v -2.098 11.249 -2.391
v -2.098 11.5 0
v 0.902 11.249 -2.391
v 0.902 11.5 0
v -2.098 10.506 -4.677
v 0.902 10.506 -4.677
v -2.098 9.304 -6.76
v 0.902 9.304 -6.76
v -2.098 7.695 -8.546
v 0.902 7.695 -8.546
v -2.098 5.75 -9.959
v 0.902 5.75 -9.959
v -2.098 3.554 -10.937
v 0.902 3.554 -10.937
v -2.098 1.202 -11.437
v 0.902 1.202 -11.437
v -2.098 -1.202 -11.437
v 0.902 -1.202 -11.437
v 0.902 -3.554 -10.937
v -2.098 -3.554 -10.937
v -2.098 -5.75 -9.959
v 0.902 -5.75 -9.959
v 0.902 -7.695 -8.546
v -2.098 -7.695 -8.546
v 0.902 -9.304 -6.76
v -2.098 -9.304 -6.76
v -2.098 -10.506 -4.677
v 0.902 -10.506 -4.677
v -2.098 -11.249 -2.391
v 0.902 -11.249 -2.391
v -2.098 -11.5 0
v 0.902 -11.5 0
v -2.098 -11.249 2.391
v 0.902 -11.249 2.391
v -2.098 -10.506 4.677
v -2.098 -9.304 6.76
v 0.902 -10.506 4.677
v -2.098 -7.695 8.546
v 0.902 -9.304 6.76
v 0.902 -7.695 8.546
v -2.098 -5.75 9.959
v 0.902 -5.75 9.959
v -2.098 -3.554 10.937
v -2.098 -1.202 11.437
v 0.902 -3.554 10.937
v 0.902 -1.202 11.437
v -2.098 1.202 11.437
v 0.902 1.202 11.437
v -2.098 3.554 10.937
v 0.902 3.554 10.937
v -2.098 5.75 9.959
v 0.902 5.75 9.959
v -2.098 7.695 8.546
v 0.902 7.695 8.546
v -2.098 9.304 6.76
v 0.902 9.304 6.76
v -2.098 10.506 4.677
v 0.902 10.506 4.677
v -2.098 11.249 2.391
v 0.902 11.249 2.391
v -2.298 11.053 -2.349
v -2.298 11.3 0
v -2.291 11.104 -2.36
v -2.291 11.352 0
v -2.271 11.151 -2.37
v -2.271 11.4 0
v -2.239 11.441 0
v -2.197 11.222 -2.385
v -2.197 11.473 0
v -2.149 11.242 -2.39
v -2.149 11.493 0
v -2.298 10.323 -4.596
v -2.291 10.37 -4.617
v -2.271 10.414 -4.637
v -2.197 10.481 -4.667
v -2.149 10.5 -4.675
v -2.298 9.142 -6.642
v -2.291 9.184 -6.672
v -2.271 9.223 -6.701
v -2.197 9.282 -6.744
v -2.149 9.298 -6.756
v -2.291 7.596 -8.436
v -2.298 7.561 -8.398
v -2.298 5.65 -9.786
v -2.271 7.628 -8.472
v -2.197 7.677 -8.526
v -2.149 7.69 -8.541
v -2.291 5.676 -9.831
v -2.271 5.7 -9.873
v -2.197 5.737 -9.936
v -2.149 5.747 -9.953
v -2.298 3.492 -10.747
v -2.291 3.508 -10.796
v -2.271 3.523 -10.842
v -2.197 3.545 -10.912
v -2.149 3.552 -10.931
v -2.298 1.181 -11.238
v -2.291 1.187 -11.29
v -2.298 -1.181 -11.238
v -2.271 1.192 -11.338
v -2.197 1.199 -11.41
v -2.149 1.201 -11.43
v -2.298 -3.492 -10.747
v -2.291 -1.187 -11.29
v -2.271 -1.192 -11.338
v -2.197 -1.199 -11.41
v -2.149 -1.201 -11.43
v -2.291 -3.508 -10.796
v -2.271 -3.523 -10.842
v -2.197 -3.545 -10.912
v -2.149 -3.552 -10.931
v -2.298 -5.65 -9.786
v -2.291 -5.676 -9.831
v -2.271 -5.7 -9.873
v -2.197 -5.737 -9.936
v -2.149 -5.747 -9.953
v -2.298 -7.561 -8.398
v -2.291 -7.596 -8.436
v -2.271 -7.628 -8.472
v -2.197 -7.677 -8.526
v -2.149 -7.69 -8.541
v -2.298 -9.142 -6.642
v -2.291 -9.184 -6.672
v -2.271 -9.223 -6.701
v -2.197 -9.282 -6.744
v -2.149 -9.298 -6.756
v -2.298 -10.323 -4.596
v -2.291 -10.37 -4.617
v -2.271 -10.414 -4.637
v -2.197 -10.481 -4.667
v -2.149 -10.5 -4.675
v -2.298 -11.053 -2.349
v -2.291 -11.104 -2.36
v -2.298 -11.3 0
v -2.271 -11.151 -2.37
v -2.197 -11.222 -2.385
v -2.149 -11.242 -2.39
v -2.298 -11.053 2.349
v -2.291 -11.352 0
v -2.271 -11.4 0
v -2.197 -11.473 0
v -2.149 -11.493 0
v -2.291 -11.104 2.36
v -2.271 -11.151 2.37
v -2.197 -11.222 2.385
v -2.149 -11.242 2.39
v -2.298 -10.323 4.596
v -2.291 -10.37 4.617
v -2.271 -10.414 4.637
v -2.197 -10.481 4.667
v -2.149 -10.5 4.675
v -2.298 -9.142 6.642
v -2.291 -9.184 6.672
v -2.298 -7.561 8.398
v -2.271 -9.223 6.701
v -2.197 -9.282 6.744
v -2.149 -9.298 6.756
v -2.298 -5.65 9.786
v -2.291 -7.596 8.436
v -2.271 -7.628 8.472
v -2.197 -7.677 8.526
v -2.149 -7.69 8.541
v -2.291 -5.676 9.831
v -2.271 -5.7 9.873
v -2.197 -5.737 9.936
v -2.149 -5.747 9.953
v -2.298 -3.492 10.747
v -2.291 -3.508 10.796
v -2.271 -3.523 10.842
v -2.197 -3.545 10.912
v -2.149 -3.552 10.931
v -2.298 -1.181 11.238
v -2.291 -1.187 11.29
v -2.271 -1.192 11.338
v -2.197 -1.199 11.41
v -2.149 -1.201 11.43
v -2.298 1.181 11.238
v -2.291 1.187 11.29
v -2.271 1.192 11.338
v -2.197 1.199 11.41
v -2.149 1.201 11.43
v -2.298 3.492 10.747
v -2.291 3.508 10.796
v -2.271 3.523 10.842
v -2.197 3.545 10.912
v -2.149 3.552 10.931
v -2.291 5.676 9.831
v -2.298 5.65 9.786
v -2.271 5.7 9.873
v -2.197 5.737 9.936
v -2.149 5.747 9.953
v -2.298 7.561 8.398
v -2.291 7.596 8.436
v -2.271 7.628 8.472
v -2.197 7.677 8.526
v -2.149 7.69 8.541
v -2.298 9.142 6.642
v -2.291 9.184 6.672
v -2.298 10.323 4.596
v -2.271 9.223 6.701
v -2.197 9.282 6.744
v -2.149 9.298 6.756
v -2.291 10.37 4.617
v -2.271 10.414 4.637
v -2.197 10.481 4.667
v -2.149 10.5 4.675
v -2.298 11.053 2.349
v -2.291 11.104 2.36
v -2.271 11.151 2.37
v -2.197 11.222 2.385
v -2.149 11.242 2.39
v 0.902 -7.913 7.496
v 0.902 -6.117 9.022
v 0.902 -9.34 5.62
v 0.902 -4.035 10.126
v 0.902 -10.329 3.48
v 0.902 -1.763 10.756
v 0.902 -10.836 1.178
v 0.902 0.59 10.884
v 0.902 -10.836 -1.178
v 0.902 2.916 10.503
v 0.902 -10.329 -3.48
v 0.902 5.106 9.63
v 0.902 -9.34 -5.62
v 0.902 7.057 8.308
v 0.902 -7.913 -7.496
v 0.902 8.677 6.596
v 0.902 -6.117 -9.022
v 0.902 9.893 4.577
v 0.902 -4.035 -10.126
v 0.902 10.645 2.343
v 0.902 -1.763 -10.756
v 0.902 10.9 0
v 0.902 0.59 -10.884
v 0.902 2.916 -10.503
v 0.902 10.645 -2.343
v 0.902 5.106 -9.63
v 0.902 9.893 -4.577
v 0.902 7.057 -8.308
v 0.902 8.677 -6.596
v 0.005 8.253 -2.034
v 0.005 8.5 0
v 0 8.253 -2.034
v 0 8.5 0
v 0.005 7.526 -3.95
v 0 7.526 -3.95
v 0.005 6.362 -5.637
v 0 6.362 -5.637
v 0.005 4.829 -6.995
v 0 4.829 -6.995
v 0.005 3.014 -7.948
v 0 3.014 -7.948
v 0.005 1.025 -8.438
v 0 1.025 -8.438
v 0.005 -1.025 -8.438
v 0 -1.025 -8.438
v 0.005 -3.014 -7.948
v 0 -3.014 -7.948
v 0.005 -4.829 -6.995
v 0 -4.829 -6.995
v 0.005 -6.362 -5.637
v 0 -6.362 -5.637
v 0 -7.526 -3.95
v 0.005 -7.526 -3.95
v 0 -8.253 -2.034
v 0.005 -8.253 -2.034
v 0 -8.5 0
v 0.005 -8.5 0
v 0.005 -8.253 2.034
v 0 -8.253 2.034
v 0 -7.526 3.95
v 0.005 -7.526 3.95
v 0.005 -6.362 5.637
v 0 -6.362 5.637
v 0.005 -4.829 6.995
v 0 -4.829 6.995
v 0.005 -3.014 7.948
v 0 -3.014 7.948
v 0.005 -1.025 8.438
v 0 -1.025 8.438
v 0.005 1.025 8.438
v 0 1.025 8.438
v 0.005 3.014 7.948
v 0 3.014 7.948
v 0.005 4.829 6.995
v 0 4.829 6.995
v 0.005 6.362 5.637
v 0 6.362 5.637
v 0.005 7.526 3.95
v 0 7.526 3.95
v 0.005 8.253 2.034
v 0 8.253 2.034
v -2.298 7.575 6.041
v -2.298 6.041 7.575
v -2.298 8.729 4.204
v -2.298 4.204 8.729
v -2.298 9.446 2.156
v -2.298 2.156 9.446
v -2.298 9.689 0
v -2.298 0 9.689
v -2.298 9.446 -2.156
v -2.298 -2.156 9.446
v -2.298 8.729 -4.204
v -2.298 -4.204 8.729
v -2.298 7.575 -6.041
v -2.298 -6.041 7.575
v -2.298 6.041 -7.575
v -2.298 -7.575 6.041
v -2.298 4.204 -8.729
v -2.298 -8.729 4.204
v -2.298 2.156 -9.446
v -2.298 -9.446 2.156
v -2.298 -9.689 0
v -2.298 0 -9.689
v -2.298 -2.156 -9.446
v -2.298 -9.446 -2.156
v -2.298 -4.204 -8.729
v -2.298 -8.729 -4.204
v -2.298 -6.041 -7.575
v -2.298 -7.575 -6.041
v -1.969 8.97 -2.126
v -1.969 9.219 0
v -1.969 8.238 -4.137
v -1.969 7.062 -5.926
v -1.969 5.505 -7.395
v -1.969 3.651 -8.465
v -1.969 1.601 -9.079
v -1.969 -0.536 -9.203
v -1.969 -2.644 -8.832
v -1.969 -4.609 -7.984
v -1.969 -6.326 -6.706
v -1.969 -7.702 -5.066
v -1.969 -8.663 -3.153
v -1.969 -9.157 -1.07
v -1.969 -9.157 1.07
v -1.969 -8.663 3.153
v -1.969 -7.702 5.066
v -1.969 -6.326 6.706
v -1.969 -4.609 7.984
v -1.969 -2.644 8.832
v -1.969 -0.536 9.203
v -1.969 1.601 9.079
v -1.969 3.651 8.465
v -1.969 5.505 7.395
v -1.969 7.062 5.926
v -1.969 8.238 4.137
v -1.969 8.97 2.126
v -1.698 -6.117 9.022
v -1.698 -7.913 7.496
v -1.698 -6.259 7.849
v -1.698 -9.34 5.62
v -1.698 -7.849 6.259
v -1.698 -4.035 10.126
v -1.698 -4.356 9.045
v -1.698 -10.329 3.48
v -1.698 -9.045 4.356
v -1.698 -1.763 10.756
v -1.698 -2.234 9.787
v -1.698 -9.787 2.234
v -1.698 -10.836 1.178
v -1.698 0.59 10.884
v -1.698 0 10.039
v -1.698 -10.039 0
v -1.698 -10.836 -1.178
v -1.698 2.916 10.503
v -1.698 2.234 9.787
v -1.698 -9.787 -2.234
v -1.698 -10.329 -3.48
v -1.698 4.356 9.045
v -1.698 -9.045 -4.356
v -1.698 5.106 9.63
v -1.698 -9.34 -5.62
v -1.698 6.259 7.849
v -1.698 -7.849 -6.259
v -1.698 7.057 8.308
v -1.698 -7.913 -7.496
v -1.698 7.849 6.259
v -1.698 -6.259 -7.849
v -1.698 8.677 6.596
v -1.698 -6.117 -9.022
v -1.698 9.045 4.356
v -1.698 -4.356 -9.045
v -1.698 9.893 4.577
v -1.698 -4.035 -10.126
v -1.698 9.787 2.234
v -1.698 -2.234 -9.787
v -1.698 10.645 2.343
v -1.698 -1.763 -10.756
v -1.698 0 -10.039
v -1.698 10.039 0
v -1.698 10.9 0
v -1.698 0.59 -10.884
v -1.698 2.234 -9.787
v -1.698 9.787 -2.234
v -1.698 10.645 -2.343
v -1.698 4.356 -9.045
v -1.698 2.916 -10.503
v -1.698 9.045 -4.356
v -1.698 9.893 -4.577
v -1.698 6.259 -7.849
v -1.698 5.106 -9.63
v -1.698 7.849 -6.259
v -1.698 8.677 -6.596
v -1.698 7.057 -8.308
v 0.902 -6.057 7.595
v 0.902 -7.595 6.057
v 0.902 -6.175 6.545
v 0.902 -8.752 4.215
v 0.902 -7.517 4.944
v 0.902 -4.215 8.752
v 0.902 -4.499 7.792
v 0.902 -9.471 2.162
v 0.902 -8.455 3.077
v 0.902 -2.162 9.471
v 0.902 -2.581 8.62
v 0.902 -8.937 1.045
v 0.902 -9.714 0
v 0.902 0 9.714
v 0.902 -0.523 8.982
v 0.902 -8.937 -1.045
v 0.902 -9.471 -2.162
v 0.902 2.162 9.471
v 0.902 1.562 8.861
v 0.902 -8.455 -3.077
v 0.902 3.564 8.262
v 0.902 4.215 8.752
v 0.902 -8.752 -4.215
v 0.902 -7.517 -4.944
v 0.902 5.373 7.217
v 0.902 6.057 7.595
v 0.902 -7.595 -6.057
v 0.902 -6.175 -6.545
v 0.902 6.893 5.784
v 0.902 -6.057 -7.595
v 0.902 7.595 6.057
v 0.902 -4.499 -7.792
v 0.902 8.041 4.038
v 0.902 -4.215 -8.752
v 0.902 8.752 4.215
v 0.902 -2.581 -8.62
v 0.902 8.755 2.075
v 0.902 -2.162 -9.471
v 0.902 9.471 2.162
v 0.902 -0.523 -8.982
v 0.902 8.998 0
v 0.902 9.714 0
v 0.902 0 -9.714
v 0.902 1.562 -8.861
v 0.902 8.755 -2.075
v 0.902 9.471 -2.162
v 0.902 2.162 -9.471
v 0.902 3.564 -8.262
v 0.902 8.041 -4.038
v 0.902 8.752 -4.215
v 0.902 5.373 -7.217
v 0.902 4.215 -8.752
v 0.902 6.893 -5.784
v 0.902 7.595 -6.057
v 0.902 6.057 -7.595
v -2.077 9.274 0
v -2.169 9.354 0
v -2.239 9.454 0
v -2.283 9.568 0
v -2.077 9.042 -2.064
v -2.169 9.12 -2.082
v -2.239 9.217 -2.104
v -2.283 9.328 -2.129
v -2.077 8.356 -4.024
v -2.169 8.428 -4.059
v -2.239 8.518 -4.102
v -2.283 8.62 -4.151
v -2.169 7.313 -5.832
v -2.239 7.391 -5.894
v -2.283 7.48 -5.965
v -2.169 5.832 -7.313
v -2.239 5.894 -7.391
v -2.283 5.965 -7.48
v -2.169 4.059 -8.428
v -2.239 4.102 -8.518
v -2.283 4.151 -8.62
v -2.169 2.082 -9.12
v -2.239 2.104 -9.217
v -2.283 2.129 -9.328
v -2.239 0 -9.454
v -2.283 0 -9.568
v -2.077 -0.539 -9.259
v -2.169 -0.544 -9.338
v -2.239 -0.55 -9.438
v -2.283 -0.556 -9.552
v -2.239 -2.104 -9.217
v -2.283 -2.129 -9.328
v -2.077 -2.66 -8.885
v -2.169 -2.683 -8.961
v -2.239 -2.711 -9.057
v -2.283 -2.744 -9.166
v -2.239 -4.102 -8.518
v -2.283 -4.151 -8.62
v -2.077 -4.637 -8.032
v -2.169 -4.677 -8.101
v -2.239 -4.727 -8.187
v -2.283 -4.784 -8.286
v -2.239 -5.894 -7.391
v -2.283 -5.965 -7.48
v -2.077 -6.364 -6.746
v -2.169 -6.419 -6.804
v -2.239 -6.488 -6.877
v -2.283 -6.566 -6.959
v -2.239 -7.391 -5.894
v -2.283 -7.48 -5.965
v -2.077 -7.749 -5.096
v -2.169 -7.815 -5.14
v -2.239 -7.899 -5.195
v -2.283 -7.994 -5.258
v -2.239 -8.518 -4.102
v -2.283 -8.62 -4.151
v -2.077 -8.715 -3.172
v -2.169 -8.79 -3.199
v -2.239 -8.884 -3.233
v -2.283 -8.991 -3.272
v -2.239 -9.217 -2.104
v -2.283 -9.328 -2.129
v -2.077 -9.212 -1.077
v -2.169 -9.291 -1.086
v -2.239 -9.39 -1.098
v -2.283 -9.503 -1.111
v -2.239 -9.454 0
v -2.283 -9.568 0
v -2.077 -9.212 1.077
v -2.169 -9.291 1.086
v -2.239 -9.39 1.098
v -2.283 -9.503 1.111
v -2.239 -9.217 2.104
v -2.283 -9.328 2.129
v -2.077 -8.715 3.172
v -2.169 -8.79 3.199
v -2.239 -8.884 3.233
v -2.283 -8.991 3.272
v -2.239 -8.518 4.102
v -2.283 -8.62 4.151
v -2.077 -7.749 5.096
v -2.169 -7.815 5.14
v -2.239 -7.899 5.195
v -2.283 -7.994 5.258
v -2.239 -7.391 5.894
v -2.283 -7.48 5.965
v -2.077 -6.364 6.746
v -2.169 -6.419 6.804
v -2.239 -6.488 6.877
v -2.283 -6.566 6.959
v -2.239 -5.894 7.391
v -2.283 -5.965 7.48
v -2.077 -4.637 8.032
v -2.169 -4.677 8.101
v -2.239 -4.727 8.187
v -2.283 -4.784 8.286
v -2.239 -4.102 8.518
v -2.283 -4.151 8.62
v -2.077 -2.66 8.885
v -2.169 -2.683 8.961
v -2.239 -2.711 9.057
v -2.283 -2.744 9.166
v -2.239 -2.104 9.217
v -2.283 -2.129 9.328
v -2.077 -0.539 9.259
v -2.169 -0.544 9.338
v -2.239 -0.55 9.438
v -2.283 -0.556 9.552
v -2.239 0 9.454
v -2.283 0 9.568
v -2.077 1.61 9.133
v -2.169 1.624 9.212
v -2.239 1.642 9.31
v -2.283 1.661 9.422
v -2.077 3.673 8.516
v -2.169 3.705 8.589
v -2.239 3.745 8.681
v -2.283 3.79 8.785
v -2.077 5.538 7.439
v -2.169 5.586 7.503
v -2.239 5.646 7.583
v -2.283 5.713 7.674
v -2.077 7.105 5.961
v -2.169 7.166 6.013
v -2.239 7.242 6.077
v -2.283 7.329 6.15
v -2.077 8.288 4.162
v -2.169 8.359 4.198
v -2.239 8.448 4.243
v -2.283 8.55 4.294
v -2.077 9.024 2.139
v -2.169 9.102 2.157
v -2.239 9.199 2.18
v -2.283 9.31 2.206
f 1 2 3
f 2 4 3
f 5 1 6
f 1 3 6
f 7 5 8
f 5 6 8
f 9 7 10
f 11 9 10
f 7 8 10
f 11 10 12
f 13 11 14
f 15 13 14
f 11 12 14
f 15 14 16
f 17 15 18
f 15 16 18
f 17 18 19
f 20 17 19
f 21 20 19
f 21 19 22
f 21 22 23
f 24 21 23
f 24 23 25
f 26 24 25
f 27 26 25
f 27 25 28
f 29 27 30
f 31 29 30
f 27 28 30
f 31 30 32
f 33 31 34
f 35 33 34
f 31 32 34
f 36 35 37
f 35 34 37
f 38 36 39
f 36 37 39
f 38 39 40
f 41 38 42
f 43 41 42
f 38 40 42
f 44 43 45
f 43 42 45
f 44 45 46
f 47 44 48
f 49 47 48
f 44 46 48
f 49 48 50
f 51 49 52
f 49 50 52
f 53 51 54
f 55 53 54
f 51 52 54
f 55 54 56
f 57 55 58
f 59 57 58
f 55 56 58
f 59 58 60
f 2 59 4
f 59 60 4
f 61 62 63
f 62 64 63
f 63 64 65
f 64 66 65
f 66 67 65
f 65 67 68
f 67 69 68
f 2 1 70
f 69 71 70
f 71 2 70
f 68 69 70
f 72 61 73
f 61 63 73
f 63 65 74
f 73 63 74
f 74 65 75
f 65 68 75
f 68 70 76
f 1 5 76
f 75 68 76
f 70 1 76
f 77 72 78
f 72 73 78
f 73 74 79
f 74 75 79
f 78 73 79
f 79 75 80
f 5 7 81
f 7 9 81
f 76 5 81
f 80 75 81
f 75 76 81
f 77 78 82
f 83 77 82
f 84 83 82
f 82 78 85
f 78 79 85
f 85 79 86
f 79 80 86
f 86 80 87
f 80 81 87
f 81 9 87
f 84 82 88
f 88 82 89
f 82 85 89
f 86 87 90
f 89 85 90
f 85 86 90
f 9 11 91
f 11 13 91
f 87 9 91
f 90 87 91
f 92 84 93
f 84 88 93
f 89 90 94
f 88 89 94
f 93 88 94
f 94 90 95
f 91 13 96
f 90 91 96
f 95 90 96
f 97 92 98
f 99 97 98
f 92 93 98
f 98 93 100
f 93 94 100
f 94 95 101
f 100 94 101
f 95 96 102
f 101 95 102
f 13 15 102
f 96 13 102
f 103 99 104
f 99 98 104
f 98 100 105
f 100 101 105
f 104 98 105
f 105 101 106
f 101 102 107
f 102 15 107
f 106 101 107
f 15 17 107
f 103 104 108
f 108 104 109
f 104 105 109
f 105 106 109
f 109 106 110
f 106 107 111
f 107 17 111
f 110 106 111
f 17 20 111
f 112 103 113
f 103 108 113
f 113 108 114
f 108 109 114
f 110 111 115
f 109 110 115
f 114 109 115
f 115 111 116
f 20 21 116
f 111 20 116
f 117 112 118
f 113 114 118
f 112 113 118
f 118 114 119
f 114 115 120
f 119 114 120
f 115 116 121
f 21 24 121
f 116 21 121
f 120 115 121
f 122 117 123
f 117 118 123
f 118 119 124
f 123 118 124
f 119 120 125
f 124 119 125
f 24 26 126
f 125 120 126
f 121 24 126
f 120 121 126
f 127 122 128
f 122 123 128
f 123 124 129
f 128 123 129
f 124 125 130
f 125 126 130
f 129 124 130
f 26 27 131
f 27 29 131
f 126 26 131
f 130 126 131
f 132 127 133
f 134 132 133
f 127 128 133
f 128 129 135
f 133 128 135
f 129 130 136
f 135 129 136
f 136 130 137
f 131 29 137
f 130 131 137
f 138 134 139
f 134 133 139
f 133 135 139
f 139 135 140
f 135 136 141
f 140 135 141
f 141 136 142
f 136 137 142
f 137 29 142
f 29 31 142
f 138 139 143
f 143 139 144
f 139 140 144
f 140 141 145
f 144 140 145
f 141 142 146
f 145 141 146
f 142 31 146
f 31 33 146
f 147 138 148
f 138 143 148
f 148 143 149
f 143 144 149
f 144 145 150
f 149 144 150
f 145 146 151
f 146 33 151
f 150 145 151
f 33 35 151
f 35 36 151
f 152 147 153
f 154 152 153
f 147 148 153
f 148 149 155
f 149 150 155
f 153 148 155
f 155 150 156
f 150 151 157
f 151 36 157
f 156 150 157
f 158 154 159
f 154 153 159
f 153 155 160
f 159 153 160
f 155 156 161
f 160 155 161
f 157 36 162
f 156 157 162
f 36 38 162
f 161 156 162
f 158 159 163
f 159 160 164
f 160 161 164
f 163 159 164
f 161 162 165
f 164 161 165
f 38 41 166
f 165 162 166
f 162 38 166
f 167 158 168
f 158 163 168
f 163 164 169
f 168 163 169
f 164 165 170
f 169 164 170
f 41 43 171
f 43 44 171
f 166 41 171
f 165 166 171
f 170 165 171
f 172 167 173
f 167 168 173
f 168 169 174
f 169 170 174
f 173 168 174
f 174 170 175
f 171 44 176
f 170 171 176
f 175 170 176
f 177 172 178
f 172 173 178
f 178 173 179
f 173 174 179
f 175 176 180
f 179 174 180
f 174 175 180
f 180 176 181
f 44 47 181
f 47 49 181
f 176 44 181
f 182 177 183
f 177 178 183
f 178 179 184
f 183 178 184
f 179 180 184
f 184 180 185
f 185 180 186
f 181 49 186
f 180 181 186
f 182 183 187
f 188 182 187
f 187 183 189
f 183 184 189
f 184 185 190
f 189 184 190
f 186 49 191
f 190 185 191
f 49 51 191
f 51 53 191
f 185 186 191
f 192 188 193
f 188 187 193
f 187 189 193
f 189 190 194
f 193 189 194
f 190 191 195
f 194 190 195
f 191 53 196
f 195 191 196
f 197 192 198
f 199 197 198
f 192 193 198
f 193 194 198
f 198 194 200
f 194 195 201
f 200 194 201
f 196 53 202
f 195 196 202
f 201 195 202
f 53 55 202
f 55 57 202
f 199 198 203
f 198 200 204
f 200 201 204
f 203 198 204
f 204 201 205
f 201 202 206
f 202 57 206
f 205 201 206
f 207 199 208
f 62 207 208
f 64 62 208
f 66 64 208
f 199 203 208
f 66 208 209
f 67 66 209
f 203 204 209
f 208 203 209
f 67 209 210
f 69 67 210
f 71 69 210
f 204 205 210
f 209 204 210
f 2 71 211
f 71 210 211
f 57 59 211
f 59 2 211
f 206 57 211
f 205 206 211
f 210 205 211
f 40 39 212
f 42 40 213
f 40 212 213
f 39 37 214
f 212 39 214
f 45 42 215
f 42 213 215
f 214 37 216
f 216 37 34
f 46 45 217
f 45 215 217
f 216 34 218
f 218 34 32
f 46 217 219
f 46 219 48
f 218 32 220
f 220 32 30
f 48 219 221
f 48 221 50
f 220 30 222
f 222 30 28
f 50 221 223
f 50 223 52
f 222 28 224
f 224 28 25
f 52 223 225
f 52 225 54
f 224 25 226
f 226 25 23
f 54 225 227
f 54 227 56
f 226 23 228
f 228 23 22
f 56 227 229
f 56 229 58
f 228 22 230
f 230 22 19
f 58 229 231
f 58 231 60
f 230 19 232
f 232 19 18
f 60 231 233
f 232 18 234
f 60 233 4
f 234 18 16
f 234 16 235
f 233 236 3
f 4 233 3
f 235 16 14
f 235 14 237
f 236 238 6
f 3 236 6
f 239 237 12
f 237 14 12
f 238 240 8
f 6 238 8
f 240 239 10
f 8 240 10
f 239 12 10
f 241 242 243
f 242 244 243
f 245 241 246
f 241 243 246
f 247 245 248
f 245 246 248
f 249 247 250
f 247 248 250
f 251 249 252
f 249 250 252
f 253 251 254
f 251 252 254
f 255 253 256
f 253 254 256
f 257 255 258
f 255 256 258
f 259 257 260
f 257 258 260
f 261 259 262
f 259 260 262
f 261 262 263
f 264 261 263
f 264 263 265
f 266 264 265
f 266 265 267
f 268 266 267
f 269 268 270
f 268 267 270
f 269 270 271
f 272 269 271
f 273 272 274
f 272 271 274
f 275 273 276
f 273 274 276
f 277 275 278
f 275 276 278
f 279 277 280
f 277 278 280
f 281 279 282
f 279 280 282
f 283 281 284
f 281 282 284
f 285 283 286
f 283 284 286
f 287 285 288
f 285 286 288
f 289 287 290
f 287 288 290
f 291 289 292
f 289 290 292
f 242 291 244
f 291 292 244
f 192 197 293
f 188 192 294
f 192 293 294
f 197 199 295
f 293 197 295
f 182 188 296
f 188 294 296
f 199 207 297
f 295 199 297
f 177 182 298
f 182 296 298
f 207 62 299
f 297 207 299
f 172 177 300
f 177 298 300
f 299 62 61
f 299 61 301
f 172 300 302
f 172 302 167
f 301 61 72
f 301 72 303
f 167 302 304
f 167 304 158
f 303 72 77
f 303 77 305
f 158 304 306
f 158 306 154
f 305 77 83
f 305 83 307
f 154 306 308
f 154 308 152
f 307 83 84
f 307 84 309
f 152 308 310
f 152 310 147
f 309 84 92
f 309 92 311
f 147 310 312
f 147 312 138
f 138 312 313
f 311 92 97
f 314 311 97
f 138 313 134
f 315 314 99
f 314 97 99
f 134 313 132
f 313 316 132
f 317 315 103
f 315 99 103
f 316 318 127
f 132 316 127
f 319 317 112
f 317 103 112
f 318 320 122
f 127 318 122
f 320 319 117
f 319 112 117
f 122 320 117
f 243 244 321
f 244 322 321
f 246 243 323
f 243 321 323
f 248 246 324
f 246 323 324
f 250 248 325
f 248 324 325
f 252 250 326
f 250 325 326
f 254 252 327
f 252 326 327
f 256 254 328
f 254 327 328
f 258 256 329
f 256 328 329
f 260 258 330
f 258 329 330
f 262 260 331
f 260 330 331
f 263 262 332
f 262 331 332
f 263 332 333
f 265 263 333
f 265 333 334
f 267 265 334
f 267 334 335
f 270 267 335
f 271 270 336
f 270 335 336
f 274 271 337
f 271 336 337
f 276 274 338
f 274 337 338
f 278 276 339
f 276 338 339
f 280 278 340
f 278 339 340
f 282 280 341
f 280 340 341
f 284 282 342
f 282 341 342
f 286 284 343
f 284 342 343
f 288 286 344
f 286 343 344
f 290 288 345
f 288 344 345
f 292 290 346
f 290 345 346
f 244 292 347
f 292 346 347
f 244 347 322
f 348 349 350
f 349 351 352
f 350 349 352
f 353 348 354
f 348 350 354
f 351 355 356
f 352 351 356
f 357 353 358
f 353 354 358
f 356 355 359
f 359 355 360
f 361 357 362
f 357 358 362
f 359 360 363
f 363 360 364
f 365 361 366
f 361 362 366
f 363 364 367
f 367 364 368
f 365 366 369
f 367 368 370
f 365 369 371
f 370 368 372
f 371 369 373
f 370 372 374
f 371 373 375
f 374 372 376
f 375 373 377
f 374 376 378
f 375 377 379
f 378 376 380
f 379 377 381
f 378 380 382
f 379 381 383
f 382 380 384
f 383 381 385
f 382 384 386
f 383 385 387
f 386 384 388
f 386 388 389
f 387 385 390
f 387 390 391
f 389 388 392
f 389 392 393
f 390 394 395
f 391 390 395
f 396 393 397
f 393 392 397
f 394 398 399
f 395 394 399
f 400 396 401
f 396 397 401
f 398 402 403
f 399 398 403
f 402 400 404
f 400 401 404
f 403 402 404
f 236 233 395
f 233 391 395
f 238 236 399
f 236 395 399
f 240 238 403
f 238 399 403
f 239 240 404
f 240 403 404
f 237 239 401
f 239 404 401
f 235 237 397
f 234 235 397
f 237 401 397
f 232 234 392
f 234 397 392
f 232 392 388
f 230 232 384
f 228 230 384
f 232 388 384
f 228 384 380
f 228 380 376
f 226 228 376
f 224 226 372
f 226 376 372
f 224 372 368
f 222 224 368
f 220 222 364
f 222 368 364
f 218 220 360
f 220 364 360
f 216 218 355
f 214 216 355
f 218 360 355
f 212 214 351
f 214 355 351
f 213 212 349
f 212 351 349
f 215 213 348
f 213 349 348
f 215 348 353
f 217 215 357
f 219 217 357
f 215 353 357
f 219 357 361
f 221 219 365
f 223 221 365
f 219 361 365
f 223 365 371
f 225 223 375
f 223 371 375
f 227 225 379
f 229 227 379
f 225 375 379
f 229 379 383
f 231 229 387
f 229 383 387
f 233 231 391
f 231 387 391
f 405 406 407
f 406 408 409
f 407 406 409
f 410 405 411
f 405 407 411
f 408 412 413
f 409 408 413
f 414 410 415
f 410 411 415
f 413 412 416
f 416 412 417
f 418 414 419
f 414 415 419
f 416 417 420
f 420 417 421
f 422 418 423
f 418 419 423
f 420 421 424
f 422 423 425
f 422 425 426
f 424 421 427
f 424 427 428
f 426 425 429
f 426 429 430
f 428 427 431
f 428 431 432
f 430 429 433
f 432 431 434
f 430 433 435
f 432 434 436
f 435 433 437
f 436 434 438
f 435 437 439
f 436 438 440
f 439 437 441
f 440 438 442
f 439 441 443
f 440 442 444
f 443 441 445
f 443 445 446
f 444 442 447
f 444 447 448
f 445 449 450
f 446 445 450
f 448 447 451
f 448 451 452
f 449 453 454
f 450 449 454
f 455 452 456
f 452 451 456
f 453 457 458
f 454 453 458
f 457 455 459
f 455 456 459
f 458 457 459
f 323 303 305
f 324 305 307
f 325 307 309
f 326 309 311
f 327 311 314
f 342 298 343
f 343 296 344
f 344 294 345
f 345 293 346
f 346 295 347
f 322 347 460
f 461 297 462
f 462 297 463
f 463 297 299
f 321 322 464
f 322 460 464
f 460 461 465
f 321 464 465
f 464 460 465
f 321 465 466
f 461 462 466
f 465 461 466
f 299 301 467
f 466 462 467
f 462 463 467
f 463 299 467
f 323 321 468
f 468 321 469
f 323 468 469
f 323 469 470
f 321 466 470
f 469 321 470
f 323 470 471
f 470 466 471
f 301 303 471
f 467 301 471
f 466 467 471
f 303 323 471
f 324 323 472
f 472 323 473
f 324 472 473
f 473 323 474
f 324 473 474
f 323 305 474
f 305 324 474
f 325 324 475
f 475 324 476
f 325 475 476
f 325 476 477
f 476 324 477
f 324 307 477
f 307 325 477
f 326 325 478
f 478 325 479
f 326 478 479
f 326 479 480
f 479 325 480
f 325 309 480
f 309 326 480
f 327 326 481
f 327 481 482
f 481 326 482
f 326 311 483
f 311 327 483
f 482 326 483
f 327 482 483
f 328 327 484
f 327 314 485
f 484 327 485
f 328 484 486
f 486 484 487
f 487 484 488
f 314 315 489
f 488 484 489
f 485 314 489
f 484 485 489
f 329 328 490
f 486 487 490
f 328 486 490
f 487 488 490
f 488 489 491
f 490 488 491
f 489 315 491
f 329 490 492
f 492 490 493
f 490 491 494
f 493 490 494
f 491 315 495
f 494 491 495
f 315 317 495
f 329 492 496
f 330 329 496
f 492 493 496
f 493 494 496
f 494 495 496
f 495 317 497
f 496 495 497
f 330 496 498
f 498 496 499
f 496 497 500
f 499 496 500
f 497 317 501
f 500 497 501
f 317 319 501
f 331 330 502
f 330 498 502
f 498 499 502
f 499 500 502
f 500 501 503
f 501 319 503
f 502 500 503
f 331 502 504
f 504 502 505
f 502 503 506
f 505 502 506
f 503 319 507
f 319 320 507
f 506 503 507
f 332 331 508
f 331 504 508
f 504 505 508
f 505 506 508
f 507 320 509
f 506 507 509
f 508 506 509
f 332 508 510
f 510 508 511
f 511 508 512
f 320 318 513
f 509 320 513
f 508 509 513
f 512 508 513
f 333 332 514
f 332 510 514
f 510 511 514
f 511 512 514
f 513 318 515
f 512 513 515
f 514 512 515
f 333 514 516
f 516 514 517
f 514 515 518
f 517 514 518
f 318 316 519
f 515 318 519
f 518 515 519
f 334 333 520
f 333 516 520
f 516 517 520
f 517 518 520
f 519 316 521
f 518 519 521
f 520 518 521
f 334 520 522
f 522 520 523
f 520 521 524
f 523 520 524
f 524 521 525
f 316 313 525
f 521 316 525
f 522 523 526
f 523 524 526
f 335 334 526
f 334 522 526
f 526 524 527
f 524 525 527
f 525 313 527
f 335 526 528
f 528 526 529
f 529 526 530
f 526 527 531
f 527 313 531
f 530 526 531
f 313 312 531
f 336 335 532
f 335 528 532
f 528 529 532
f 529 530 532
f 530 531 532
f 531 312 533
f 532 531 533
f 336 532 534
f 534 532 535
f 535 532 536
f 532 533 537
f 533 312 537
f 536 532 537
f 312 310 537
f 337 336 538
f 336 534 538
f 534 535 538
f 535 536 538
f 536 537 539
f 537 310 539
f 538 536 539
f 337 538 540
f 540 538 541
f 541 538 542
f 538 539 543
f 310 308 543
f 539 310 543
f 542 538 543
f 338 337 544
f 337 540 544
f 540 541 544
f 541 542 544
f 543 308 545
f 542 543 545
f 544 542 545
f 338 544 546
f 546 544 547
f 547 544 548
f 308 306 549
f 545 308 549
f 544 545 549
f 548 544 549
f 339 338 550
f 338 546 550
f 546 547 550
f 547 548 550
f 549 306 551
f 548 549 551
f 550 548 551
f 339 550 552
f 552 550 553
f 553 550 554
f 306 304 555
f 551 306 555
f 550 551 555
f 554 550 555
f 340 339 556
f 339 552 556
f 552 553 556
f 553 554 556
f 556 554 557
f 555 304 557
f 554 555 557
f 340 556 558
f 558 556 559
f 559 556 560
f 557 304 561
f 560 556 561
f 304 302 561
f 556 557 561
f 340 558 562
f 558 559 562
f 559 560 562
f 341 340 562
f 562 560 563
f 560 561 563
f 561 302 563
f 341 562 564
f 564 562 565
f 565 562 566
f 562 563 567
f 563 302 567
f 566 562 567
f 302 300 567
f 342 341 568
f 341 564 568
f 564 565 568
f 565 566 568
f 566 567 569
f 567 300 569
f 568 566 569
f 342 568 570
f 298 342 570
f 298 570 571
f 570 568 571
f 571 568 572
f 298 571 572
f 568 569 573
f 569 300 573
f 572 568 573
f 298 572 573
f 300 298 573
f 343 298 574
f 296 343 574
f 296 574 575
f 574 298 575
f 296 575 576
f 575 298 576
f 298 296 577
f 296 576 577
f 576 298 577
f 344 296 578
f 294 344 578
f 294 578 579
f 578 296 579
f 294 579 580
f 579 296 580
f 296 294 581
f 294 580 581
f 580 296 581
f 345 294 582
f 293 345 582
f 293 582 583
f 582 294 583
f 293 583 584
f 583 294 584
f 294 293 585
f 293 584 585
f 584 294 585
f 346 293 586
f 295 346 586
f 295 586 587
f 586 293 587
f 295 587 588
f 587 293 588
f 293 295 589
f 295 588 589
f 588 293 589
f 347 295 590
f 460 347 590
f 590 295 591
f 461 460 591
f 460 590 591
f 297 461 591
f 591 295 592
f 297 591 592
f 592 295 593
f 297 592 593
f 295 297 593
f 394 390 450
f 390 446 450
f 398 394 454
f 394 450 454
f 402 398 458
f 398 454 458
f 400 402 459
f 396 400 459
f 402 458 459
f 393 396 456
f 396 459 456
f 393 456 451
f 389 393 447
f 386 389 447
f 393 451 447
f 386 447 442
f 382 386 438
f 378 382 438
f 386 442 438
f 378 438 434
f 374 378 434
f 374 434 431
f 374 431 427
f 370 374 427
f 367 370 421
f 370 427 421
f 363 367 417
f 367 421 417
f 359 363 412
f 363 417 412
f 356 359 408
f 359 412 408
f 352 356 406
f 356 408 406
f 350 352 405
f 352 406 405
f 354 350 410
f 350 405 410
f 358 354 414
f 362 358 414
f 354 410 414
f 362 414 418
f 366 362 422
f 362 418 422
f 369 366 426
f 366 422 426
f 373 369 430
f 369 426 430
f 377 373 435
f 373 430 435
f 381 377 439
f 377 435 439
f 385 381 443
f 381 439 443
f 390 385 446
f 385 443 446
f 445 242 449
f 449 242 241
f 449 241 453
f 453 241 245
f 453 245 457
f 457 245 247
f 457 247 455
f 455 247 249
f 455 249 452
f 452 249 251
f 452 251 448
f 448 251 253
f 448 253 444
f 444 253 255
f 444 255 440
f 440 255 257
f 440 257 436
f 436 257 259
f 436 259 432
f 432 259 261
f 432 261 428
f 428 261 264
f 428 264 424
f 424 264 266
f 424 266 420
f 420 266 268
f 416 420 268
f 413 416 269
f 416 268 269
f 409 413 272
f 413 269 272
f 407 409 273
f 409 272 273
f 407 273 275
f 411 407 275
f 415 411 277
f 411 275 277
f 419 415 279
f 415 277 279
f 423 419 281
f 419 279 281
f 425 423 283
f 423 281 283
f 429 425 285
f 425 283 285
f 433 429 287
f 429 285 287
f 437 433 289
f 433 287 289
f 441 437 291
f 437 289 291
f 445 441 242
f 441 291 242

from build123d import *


with BuildPart() as part:
    # Sketch1 → Revolve2 (revolve)
    with BuildSketch(Plane.XY):
        with BuildLine():
            Line((0.9025, 9.714192053), (0.9025, 8.997599754))
            Line((0.9025, 8.997599754), (0.005, 8.5))
            Line((0.005, 8.5), (0, 8.5))
            Line((0, 8.5), (-1.96898625, 9.218913515))
            ThreePointArc((-1.96898625, 9.218913515), (-2.207221323, 9.402005642), (-2.2975, 9.688586237))
            Line((-2.2975, 9.688586237), (-2.2975, 11.3))
            ThreePointArc((-2.2975, 11.3), (-2.238921356, 11.441421356), (-2.0975, 11.5))
            Line((-2.0975, 11.5), (0.9025, 11.5))
            Line((0.9025, 11.5), (0.9025, 10.9))
            Line((0.9025, 10.9), (-1.6975, 10.9))
            Line((-1.6975, 10.9), (-1.6975, 10.039192053))
            Line((-1.6975, 10.039192053), (0.9025, 9.714192053))
        make_face()
    revolve(axis=Axis((0, 0, 0), (-1, 0, 0)))


solid = part.part
